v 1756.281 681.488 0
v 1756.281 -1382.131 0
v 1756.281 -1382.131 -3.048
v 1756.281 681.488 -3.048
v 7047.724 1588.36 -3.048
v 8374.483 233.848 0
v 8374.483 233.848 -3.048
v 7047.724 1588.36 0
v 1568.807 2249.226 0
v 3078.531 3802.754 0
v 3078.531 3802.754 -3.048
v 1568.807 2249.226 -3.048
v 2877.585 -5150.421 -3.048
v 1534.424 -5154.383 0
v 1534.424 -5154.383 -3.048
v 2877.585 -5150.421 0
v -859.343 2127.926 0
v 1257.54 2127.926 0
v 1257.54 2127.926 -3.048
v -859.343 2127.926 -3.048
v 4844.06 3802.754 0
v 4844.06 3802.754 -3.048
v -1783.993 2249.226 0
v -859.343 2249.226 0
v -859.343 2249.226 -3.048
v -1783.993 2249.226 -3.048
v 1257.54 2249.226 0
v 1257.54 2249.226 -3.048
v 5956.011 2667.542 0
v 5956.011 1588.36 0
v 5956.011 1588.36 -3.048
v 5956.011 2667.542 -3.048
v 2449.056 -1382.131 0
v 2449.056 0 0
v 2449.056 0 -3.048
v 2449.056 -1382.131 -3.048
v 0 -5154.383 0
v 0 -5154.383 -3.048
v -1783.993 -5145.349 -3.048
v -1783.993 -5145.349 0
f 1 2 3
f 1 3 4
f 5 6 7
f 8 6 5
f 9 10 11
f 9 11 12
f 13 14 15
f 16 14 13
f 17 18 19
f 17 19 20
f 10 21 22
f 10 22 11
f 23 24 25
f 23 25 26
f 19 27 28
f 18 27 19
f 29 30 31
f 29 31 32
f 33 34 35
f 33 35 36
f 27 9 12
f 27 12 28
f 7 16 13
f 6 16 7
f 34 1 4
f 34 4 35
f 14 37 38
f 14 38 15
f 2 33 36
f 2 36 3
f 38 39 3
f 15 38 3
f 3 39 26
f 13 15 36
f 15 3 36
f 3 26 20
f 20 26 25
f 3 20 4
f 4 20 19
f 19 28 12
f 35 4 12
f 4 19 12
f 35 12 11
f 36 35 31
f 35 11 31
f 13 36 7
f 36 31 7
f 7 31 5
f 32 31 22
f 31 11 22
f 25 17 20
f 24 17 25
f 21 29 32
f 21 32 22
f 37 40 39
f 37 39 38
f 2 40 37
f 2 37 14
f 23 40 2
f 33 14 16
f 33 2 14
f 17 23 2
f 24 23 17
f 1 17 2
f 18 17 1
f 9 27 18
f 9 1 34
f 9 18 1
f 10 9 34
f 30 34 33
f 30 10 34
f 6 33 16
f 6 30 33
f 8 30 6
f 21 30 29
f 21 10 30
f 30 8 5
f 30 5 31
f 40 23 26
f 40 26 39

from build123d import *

# Parameters (mm, degrees)
F4_DEPTH = 3.048


# Not quite as in the source:
# - the program builds the solid bodies; features that only make, move or delete a surface that nothing else refers to are left out


with BuildPart() as f4:
    # F0 (on Top) → F4 (new body)
    with BuildSketch(Plane.XY):
        Polygon((-859.3434095383, 2249.2264169165), (-1783.9930057526, 2249.2264169165), (-1783.9930057526, -1707.3482275009), (619.3107366562, -1707.3482275009), (619.3107366562, -2341.3591384888), (0, -2341.3591384888), (-1783.9930057526, -2341.3591384888), (-1783.9930057526, -5145.3490257263), (0, -5154.3831825256), (1534.4239473343, -5154.3831825256), (2877.5852176544, -5150.4210421951), (3421.4589595795, -4617.690990831), (6357.0975280814, -1742.2021322423), (8374.4828170111, 233.8479796617), (7047.7240208756, 1588.3600242488), (5956.0112953186, 1588.3600242488), (5956.0112953186, 2667.5424575806), (4844.0600873968, 3802.7535513455), (3078.5310268402, 3802.7535513455), (1568.8069942474, 2249.2264169165), (1257.5402259827, 2249.2264169165), (1257.5402259827, 2127.9256343842), (-859.3434095383, 2127.9256343842), align=None)
        Polygon((1756.28054142, -1382.1313381195), (1756.28054142, 681.4878258383), (2449.0561485291, 0), (2449.0561485291, -1382.1313381195), align=None, mode=Mode.SUBTRACT)
        Polygon((619.3107366562, -1707.3482275009), (-1783.9930057526, -1707.3482275009), (-1783.9930057526, -2341.3591384888), (0, -2341.3591384888), (619.3107366562, -2341.3591384888), align=None)
    extrude(amount=-F4_DEPTH)


solid = f4.part
